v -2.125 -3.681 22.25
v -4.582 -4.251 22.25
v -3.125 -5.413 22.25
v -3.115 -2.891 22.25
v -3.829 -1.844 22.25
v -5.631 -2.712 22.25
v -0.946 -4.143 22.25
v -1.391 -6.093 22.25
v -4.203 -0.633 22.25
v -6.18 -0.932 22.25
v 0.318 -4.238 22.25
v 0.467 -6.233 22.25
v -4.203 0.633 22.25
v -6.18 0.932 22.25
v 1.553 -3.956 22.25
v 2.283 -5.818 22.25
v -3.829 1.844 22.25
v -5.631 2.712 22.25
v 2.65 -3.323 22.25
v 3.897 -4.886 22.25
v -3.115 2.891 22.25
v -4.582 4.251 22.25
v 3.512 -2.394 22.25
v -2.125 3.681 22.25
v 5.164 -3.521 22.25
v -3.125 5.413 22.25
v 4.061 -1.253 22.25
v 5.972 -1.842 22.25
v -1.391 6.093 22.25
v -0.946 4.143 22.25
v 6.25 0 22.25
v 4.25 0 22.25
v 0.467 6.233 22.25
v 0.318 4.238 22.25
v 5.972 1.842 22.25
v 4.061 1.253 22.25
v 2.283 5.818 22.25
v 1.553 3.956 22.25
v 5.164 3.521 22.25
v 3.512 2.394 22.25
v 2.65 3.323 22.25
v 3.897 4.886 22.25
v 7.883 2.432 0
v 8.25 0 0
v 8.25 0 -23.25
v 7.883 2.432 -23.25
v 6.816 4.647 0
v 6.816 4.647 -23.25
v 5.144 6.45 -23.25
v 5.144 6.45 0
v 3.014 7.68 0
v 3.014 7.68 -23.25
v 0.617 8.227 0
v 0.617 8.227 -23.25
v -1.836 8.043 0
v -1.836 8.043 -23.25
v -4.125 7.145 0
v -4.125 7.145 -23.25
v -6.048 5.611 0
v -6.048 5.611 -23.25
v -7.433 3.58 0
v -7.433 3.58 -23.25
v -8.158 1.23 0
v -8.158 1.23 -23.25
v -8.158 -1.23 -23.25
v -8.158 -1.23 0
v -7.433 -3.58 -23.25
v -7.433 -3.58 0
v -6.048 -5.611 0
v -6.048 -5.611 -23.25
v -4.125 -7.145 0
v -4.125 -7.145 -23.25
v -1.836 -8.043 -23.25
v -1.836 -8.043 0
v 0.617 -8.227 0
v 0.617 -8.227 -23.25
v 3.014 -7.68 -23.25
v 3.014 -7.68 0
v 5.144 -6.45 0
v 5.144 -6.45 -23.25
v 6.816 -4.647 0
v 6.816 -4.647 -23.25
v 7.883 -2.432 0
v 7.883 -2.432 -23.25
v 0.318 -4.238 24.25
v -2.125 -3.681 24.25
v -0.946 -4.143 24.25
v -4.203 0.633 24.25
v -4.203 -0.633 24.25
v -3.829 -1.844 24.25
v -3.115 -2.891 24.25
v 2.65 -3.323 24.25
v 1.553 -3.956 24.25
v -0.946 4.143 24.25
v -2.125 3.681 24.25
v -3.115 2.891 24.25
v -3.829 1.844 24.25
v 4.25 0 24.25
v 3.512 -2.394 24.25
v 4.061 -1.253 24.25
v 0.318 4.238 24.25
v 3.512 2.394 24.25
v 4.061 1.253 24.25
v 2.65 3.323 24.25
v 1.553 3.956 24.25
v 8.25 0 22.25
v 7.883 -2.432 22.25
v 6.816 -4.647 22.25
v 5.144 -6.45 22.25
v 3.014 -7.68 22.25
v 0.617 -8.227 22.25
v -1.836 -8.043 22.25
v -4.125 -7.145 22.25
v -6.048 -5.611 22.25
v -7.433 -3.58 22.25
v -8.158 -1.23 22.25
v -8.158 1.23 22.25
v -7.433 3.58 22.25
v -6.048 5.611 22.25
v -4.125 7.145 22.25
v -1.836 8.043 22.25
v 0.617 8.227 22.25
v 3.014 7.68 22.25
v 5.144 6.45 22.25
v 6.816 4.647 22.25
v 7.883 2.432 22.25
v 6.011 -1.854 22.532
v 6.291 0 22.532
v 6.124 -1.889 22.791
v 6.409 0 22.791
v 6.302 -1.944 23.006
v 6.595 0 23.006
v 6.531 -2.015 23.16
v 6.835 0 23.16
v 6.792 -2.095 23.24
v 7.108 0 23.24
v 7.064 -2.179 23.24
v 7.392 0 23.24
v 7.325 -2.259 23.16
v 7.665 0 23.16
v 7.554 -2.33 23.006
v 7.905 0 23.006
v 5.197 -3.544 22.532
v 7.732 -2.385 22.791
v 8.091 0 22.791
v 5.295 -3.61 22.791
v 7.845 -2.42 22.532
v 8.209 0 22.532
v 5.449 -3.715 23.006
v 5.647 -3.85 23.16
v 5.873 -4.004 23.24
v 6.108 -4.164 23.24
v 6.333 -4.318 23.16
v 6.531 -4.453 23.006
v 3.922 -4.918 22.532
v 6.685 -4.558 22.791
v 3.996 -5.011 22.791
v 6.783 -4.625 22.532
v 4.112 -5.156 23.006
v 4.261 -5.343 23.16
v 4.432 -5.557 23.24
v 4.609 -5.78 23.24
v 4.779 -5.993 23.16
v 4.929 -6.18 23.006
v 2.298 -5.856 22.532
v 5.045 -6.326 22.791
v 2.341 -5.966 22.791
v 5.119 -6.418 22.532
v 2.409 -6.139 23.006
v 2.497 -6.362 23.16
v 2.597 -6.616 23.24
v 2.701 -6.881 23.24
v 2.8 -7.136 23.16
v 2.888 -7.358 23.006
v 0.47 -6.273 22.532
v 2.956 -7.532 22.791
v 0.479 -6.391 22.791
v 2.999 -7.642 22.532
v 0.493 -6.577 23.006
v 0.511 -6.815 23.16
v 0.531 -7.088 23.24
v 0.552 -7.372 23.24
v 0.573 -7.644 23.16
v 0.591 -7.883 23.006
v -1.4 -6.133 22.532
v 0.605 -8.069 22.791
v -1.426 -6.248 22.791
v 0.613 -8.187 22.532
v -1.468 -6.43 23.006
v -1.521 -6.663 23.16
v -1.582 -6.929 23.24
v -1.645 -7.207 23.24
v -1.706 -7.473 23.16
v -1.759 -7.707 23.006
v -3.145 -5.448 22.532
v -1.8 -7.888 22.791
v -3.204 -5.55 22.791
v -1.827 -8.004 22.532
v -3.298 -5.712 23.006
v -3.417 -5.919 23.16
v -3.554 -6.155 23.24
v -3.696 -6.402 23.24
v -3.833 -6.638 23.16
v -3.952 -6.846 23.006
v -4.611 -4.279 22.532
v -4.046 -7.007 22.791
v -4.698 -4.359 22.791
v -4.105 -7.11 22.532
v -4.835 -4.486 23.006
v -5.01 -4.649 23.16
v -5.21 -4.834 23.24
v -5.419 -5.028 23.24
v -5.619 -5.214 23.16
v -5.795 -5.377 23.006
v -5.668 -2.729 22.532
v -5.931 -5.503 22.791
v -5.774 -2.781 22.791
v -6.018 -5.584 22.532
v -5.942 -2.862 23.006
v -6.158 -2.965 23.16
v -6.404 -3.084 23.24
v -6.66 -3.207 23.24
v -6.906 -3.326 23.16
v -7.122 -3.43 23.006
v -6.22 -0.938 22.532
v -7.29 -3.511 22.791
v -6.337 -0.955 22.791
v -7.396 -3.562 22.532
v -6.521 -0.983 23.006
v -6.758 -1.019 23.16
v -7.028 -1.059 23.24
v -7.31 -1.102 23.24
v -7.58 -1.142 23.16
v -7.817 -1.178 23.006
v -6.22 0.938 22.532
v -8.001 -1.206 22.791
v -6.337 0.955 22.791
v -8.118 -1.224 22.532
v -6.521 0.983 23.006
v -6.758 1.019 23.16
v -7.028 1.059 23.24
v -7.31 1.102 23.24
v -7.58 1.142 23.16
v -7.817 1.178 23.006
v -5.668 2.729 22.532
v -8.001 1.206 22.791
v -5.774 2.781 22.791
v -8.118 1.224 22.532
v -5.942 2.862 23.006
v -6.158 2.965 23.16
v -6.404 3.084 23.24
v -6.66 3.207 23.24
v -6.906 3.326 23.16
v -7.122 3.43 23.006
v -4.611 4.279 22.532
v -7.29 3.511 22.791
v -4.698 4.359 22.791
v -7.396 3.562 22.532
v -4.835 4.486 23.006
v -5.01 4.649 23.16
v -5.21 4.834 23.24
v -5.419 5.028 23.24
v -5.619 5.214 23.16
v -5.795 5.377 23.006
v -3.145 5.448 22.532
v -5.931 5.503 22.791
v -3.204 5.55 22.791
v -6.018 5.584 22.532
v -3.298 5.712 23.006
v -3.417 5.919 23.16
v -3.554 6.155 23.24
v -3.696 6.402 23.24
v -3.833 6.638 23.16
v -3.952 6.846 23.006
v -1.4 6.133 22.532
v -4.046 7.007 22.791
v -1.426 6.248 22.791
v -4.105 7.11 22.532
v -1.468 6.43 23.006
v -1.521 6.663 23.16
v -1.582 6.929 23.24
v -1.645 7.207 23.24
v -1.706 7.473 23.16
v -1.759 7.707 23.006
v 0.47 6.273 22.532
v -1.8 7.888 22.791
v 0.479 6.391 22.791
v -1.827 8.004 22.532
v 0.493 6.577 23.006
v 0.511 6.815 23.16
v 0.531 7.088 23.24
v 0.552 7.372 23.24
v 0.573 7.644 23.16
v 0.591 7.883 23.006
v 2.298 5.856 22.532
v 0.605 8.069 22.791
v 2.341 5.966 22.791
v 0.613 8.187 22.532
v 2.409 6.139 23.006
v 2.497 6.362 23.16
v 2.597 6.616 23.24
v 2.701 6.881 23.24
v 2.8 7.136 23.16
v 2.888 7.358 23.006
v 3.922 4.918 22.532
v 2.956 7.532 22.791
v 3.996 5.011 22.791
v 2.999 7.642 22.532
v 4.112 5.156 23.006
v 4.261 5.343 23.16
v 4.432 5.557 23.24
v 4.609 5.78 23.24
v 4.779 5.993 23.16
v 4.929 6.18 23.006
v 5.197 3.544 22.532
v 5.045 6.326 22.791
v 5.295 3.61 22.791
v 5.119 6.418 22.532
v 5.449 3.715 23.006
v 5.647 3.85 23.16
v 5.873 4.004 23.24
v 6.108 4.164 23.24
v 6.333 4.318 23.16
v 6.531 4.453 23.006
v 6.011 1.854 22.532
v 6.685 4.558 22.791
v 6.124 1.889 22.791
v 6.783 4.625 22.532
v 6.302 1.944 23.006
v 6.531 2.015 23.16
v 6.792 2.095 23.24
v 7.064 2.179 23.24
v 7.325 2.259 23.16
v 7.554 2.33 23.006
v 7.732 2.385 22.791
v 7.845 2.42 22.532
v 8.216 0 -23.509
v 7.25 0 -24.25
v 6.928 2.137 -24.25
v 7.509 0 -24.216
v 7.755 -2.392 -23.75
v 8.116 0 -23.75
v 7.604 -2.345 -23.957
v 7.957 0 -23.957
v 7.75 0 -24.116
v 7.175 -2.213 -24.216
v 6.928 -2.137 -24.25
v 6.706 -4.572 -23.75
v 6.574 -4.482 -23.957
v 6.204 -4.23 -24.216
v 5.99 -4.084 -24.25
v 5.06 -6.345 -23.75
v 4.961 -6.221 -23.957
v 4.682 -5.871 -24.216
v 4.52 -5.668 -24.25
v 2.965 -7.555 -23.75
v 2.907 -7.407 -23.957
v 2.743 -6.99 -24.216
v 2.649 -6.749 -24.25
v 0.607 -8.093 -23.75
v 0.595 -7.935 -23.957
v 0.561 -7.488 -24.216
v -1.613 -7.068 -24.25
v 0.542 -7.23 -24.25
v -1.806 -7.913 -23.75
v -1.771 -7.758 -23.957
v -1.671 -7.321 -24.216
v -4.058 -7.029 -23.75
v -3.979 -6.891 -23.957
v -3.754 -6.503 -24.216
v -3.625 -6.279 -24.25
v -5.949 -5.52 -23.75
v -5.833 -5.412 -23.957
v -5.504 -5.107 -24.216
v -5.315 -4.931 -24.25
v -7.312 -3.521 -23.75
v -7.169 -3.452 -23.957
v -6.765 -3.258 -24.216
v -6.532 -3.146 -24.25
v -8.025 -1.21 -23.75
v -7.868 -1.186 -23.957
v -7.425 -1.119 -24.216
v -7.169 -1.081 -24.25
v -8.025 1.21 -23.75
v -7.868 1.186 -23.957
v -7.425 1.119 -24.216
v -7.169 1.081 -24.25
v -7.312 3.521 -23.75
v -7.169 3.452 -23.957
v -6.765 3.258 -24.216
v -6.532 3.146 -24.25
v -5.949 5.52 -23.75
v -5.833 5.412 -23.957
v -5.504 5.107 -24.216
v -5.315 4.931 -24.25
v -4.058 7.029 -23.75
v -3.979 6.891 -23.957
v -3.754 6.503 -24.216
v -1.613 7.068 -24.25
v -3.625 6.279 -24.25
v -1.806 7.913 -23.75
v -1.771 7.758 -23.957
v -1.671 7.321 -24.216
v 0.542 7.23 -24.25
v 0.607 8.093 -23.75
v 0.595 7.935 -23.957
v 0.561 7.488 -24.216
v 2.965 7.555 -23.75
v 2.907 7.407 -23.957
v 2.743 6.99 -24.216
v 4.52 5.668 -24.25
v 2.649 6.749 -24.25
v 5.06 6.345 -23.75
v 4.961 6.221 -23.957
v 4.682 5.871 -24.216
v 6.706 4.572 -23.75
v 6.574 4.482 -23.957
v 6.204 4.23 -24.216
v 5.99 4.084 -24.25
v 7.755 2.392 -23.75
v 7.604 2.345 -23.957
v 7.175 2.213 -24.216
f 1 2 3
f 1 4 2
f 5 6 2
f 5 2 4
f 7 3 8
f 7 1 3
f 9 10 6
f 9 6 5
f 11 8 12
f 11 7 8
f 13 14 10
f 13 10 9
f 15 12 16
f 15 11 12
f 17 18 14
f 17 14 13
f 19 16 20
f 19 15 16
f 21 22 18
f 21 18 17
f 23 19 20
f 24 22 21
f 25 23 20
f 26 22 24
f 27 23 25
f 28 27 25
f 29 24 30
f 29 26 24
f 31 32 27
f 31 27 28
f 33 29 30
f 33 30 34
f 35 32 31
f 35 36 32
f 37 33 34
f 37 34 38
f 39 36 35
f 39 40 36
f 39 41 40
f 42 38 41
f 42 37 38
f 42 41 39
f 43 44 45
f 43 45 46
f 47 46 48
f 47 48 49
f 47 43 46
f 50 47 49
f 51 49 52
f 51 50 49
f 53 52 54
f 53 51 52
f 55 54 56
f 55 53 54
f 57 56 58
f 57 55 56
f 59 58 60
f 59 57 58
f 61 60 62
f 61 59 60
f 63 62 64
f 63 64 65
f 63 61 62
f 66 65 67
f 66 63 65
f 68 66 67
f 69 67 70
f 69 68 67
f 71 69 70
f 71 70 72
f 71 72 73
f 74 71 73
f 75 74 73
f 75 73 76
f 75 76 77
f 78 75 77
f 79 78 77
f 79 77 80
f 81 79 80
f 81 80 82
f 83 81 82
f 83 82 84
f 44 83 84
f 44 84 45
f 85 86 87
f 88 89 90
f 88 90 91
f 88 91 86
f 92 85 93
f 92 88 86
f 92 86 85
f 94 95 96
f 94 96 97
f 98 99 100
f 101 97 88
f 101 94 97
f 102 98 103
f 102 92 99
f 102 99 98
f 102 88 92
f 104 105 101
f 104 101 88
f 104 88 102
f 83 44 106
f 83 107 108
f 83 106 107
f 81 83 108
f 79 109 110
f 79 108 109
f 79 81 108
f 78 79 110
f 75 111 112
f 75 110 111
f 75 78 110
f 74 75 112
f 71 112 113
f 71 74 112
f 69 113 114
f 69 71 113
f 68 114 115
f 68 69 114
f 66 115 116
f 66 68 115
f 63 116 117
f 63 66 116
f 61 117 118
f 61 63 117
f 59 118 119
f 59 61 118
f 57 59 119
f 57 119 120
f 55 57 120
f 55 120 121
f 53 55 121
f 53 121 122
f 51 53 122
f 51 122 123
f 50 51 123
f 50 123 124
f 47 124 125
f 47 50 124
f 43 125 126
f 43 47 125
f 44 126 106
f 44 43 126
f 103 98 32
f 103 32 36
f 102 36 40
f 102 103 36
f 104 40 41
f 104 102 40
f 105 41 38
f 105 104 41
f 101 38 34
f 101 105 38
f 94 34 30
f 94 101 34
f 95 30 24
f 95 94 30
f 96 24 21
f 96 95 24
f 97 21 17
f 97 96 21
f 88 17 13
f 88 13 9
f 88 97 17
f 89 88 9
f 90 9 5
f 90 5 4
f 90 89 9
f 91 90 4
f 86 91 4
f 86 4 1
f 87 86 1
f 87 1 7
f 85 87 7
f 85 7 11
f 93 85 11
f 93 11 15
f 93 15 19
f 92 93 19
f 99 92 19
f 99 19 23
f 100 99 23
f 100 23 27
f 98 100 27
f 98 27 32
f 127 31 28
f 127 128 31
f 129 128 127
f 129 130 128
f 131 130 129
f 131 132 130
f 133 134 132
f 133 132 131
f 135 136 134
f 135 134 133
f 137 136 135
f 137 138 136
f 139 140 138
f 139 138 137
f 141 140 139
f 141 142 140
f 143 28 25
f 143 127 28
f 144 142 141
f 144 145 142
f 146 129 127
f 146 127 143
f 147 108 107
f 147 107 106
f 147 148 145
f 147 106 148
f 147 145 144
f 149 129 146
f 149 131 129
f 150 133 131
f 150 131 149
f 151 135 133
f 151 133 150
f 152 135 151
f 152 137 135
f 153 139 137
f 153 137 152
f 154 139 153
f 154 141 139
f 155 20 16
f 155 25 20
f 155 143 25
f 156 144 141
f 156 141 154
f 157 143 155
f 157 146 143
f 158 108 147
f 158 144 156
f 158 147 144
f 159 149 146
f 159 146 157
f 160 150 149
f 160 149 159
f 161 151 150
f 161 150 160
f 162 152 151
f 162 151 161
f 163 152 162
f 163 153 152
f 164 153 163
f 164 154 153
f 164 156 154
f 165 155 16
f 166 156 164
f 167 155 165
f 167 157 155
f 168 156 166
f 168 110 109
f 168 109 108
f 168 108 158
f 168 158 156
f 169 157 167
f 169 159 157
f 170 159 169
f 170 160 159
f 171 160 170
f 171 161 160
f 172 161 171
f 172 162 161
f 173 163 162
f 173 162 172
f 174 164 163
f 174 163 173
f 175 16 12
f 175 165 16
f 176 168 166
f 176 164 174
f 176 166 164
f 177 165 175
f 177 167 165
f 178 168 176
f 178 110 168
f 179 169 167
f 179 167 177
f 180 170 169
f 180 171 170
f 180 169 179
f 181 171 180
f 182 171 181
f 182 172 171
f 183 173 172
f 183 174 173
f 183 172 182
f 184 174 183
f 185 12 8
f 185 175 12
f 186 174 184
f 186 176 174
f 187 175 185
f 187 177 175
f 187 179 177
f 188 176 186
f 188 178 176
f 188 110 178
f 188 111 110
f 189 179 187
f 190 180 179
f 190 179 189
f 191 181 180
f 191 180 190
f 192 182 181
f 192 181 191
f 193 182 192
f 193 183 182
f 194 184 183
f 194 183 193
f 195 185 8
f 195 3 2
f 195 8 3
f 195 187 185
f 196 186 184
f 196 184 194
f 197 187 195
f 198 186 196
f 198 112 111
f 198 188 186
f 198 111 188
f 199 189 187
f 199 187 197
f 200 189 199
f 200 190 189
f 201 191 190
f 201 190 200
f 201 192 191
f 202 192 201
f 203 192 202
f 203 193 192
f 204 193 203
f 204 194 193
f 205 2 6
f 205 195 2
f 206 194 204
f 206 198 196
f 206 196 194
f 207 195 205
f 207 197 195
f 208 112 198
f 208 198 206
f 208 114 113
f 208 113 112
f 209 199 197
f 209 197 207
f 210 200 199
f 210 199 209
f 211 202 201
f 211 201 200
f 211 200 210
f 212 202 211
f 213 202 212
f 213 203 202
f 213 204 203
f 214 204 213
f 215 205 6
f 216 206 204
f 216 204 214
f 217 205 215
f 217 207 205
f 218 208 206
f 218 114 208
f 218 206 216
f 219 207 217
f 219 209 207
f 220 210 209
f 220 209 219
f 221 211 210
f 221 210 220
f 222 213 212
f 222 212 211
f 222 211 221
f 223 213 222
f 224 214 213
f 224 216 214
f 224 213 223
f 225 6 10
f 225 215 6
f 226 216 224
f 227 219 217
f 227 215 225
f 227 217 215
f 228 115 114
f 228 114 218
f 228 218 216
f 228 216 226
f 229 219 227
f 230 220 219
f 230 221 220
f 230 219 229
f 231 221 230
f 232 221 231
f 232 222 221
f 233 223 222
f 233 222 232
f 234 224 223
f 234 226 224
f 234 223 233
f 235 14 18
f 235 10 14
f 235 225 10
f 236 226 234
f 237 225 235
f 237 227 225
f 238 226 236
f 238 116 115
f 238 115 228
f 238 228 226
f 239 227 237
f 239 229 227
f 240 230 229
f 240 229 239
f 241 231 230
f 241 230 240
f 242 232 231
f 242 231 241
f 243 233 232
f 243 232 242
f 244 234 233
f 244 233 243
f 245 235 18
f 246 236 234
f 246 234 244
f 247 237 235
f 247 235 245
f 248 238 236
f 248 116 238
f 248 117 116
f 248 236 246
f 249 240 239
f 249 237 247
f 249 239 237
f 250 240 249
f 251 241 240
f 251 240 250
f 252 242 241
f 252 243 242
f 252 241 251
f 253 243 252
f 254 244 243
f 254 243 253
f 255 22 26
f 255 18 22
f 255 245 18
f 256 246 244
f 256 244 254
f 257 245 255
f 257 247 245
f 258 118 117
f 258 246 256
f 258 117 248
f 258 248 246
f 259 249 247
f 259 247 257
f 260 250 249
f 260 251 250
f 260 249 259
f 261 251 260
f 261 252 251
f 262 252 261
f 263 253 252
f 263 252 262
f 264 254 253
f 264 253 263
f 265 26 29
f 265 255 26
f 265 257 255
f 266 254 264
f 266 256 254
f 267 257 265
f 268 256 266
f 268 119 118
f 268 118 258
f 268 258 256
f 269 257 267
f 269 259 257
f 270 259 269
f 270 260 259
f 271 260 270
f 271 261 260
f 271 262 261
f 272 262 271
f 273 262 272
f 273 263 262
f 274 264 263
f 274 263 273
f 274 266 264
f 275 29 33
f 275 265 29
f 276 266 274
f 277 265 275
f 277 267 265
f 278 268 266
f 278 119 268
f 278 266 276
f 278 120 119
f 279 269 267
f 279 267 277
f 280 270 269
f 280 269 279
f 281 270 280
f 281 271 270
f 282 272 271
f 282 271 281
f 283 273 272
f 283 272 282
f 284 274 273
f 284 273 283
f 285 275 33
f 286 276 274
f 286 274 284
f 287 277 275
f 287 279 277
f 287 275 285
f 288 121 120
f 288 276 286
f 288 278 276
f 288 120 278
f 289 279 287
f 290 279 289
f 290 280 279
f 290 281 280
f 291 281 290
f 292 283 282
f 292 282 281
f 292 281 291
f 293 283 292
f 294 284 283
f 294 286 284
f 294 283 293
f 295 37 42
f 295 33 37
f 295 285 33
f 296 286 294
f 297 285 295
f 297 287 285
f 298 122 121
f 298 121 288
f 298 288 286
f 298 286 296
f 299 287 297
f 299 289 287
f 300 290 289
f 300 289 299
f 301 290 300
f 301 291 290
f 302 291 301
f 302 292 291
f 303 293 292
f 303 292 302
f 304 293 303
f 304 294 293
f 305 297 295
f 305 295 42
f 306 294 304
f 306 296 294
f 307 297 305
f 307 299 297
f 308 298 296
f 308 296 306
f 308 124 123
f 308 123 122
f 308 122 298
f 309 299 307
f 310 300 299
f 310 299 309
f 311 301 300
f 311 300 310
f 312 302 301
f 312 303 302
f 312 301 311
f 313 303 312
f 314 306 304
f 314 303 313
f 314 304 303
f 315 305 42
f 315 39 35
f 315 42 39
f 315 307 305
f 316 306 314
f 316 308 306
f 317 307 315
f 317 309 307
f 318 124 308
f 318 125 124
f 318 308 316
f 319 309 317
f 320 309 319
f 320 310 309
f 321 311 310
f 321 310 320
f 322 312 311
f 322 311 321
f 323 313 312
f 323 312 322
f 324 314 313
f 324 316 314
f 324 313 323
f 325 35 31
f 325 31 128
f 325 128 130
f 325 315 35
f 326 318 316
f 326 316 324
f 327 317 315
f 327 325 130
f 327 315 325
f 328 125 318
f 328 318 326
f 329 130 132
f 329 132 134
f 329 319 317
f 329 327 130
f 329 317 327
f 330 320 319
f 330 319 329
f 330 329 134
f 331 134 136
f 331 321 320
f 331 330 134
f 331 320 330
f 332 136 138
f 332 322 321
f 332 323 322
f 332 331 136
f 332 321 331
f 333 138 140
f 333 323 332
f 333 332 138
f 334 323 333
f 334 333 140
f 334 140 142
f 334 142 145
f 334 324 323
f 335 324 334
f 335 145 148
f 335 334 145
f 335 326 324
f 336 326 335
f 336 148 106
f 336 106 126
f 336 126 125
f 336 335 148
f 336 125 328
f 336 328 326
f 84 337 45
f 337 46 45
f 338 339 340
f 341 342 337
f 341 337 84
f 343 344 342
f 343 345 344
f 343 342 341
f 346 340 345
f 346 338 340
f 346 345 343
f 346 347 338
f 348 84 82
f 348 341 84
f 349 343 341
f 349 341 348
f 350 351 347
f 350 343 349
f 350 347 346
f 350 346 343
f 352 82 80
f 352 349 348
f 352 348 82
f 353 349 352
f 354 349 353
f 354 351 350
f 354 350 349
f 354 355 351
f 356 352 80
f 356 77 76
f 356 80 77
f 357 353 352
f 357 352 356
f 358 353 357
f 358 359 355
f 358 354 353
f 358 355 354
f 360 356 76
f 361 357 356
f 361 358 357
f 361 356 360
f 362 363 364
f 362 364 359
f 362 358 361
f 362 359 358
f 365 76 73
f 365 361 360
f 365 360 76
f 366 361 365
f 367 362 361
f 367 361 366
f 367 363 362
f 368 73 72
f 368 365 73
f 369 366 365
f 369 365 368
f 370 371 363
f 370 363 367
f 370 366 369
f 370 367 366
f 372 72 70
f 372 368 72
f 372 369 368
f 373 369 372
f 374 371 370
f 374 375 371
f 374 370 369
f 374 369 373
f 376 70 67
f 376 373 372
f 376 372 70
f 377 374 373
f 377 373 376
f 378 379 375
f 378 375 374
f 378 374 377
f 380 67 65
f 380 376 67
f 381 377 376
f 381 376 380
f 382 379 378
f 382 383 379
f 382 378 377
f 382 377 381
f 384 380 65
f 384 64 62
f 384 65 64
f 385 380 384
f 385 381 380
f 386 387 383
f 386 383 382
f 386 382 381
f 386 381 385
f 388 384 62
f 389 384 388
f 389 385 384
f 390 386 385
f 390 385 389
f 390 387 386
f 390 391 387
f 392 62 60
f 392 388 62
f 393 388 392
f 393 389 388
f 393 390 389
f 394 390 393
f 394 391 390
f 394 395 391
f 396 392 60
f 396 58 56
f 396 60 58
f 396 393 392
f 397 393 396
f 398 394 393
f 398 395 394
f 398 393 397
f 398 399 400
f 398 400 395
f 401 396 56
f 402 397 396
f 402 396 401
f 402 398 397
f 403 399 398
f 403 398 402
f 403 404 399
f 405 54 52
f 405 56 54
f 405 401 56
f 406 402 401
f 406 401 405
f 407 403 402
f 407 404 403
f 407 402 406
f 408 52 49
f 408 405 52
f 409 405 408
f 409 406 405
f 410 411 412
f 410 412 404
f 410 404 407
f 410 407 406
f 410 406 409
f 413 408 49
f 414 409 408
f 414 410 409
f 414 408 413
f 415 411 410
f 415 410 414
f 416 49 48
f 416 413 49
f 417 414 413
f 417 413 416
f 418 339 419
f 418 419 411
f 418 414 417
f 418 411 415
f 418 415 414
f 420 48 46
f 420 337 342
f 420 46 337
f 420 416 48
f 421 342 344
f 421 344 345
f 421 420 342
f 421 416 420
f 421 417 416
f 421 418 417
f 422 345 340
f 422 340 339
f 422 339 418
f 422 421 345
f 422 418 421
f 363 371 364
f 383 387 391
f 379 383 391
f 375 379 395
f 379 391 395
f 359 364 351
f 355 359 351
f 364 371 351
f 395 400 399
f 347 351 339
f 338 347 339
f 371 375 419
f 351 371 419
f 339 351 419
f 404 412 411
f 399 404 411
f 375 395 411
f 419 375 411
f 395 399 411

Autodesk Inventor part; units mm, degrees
ref_plane "YZ Plane" through (0, 0, 0) normal (1, 0, 0) x (0, 1, 0)
ref_plane "XZ Plane" through (0, 0, 0) normal (0, 1, 0) x (-1, 0, 0)
ref_plane "XY Plane" through (0, 0, 0) normal (0, 0, 1) x (1, 0, 0)
sketch "Sketch1" plane through (0, 0, 0) normal (0, 0, 1) x (1, 0, 0)
  circle A0 centre (0, 0) radius 8.25
  dimension "d0" = 16.5
extrude "cylinder" add sketch "Sketch1" along normal mid plane 48.5
sketch "Sketch7" plane through (0, 0, 24.25) normal (0, 0, 1) x (1, 0, 0)
  circle A0 centre (0, 0) radius 8.25 projected
  circle A1 centre (0, 0) radius 4.25
  circle A2 centre (0, 0) radius 8.25
  dimension "d17" = 8.5
extrude "button" cut sketch "Sketch7" against normal blind 2
fillet "Fillet1" radius 1 1 edges at (-8.25, 0, -24.25)
sketch "Sketch8" plane through (0, 0, 0) normal (0, 1, 0) x (-1, 0, 0)
  arc A0 (-6.25, 22.25) -> (-8.25, 22.25) centre (-7.25, 22.25) ccw
  line L0 (-8.25, 22.25) -> (8.25, 22.25) projected
  line L1 (-6.25, 23.25) -> (-8.25, 23.25)
  line L2 (0, -34.65) -> (0, 34.65) projected
  point P0 (0, 0)
  dimension "d20" = 1
  dimension "d21" = 8.25
revolve "rolled_edge" add sketch "Sketch8" angle 360 about axis through (0, 0, 0) along (0, 0, 1)
properties part number "battery_A_SanyoKR1700AU" material "NiCad"
